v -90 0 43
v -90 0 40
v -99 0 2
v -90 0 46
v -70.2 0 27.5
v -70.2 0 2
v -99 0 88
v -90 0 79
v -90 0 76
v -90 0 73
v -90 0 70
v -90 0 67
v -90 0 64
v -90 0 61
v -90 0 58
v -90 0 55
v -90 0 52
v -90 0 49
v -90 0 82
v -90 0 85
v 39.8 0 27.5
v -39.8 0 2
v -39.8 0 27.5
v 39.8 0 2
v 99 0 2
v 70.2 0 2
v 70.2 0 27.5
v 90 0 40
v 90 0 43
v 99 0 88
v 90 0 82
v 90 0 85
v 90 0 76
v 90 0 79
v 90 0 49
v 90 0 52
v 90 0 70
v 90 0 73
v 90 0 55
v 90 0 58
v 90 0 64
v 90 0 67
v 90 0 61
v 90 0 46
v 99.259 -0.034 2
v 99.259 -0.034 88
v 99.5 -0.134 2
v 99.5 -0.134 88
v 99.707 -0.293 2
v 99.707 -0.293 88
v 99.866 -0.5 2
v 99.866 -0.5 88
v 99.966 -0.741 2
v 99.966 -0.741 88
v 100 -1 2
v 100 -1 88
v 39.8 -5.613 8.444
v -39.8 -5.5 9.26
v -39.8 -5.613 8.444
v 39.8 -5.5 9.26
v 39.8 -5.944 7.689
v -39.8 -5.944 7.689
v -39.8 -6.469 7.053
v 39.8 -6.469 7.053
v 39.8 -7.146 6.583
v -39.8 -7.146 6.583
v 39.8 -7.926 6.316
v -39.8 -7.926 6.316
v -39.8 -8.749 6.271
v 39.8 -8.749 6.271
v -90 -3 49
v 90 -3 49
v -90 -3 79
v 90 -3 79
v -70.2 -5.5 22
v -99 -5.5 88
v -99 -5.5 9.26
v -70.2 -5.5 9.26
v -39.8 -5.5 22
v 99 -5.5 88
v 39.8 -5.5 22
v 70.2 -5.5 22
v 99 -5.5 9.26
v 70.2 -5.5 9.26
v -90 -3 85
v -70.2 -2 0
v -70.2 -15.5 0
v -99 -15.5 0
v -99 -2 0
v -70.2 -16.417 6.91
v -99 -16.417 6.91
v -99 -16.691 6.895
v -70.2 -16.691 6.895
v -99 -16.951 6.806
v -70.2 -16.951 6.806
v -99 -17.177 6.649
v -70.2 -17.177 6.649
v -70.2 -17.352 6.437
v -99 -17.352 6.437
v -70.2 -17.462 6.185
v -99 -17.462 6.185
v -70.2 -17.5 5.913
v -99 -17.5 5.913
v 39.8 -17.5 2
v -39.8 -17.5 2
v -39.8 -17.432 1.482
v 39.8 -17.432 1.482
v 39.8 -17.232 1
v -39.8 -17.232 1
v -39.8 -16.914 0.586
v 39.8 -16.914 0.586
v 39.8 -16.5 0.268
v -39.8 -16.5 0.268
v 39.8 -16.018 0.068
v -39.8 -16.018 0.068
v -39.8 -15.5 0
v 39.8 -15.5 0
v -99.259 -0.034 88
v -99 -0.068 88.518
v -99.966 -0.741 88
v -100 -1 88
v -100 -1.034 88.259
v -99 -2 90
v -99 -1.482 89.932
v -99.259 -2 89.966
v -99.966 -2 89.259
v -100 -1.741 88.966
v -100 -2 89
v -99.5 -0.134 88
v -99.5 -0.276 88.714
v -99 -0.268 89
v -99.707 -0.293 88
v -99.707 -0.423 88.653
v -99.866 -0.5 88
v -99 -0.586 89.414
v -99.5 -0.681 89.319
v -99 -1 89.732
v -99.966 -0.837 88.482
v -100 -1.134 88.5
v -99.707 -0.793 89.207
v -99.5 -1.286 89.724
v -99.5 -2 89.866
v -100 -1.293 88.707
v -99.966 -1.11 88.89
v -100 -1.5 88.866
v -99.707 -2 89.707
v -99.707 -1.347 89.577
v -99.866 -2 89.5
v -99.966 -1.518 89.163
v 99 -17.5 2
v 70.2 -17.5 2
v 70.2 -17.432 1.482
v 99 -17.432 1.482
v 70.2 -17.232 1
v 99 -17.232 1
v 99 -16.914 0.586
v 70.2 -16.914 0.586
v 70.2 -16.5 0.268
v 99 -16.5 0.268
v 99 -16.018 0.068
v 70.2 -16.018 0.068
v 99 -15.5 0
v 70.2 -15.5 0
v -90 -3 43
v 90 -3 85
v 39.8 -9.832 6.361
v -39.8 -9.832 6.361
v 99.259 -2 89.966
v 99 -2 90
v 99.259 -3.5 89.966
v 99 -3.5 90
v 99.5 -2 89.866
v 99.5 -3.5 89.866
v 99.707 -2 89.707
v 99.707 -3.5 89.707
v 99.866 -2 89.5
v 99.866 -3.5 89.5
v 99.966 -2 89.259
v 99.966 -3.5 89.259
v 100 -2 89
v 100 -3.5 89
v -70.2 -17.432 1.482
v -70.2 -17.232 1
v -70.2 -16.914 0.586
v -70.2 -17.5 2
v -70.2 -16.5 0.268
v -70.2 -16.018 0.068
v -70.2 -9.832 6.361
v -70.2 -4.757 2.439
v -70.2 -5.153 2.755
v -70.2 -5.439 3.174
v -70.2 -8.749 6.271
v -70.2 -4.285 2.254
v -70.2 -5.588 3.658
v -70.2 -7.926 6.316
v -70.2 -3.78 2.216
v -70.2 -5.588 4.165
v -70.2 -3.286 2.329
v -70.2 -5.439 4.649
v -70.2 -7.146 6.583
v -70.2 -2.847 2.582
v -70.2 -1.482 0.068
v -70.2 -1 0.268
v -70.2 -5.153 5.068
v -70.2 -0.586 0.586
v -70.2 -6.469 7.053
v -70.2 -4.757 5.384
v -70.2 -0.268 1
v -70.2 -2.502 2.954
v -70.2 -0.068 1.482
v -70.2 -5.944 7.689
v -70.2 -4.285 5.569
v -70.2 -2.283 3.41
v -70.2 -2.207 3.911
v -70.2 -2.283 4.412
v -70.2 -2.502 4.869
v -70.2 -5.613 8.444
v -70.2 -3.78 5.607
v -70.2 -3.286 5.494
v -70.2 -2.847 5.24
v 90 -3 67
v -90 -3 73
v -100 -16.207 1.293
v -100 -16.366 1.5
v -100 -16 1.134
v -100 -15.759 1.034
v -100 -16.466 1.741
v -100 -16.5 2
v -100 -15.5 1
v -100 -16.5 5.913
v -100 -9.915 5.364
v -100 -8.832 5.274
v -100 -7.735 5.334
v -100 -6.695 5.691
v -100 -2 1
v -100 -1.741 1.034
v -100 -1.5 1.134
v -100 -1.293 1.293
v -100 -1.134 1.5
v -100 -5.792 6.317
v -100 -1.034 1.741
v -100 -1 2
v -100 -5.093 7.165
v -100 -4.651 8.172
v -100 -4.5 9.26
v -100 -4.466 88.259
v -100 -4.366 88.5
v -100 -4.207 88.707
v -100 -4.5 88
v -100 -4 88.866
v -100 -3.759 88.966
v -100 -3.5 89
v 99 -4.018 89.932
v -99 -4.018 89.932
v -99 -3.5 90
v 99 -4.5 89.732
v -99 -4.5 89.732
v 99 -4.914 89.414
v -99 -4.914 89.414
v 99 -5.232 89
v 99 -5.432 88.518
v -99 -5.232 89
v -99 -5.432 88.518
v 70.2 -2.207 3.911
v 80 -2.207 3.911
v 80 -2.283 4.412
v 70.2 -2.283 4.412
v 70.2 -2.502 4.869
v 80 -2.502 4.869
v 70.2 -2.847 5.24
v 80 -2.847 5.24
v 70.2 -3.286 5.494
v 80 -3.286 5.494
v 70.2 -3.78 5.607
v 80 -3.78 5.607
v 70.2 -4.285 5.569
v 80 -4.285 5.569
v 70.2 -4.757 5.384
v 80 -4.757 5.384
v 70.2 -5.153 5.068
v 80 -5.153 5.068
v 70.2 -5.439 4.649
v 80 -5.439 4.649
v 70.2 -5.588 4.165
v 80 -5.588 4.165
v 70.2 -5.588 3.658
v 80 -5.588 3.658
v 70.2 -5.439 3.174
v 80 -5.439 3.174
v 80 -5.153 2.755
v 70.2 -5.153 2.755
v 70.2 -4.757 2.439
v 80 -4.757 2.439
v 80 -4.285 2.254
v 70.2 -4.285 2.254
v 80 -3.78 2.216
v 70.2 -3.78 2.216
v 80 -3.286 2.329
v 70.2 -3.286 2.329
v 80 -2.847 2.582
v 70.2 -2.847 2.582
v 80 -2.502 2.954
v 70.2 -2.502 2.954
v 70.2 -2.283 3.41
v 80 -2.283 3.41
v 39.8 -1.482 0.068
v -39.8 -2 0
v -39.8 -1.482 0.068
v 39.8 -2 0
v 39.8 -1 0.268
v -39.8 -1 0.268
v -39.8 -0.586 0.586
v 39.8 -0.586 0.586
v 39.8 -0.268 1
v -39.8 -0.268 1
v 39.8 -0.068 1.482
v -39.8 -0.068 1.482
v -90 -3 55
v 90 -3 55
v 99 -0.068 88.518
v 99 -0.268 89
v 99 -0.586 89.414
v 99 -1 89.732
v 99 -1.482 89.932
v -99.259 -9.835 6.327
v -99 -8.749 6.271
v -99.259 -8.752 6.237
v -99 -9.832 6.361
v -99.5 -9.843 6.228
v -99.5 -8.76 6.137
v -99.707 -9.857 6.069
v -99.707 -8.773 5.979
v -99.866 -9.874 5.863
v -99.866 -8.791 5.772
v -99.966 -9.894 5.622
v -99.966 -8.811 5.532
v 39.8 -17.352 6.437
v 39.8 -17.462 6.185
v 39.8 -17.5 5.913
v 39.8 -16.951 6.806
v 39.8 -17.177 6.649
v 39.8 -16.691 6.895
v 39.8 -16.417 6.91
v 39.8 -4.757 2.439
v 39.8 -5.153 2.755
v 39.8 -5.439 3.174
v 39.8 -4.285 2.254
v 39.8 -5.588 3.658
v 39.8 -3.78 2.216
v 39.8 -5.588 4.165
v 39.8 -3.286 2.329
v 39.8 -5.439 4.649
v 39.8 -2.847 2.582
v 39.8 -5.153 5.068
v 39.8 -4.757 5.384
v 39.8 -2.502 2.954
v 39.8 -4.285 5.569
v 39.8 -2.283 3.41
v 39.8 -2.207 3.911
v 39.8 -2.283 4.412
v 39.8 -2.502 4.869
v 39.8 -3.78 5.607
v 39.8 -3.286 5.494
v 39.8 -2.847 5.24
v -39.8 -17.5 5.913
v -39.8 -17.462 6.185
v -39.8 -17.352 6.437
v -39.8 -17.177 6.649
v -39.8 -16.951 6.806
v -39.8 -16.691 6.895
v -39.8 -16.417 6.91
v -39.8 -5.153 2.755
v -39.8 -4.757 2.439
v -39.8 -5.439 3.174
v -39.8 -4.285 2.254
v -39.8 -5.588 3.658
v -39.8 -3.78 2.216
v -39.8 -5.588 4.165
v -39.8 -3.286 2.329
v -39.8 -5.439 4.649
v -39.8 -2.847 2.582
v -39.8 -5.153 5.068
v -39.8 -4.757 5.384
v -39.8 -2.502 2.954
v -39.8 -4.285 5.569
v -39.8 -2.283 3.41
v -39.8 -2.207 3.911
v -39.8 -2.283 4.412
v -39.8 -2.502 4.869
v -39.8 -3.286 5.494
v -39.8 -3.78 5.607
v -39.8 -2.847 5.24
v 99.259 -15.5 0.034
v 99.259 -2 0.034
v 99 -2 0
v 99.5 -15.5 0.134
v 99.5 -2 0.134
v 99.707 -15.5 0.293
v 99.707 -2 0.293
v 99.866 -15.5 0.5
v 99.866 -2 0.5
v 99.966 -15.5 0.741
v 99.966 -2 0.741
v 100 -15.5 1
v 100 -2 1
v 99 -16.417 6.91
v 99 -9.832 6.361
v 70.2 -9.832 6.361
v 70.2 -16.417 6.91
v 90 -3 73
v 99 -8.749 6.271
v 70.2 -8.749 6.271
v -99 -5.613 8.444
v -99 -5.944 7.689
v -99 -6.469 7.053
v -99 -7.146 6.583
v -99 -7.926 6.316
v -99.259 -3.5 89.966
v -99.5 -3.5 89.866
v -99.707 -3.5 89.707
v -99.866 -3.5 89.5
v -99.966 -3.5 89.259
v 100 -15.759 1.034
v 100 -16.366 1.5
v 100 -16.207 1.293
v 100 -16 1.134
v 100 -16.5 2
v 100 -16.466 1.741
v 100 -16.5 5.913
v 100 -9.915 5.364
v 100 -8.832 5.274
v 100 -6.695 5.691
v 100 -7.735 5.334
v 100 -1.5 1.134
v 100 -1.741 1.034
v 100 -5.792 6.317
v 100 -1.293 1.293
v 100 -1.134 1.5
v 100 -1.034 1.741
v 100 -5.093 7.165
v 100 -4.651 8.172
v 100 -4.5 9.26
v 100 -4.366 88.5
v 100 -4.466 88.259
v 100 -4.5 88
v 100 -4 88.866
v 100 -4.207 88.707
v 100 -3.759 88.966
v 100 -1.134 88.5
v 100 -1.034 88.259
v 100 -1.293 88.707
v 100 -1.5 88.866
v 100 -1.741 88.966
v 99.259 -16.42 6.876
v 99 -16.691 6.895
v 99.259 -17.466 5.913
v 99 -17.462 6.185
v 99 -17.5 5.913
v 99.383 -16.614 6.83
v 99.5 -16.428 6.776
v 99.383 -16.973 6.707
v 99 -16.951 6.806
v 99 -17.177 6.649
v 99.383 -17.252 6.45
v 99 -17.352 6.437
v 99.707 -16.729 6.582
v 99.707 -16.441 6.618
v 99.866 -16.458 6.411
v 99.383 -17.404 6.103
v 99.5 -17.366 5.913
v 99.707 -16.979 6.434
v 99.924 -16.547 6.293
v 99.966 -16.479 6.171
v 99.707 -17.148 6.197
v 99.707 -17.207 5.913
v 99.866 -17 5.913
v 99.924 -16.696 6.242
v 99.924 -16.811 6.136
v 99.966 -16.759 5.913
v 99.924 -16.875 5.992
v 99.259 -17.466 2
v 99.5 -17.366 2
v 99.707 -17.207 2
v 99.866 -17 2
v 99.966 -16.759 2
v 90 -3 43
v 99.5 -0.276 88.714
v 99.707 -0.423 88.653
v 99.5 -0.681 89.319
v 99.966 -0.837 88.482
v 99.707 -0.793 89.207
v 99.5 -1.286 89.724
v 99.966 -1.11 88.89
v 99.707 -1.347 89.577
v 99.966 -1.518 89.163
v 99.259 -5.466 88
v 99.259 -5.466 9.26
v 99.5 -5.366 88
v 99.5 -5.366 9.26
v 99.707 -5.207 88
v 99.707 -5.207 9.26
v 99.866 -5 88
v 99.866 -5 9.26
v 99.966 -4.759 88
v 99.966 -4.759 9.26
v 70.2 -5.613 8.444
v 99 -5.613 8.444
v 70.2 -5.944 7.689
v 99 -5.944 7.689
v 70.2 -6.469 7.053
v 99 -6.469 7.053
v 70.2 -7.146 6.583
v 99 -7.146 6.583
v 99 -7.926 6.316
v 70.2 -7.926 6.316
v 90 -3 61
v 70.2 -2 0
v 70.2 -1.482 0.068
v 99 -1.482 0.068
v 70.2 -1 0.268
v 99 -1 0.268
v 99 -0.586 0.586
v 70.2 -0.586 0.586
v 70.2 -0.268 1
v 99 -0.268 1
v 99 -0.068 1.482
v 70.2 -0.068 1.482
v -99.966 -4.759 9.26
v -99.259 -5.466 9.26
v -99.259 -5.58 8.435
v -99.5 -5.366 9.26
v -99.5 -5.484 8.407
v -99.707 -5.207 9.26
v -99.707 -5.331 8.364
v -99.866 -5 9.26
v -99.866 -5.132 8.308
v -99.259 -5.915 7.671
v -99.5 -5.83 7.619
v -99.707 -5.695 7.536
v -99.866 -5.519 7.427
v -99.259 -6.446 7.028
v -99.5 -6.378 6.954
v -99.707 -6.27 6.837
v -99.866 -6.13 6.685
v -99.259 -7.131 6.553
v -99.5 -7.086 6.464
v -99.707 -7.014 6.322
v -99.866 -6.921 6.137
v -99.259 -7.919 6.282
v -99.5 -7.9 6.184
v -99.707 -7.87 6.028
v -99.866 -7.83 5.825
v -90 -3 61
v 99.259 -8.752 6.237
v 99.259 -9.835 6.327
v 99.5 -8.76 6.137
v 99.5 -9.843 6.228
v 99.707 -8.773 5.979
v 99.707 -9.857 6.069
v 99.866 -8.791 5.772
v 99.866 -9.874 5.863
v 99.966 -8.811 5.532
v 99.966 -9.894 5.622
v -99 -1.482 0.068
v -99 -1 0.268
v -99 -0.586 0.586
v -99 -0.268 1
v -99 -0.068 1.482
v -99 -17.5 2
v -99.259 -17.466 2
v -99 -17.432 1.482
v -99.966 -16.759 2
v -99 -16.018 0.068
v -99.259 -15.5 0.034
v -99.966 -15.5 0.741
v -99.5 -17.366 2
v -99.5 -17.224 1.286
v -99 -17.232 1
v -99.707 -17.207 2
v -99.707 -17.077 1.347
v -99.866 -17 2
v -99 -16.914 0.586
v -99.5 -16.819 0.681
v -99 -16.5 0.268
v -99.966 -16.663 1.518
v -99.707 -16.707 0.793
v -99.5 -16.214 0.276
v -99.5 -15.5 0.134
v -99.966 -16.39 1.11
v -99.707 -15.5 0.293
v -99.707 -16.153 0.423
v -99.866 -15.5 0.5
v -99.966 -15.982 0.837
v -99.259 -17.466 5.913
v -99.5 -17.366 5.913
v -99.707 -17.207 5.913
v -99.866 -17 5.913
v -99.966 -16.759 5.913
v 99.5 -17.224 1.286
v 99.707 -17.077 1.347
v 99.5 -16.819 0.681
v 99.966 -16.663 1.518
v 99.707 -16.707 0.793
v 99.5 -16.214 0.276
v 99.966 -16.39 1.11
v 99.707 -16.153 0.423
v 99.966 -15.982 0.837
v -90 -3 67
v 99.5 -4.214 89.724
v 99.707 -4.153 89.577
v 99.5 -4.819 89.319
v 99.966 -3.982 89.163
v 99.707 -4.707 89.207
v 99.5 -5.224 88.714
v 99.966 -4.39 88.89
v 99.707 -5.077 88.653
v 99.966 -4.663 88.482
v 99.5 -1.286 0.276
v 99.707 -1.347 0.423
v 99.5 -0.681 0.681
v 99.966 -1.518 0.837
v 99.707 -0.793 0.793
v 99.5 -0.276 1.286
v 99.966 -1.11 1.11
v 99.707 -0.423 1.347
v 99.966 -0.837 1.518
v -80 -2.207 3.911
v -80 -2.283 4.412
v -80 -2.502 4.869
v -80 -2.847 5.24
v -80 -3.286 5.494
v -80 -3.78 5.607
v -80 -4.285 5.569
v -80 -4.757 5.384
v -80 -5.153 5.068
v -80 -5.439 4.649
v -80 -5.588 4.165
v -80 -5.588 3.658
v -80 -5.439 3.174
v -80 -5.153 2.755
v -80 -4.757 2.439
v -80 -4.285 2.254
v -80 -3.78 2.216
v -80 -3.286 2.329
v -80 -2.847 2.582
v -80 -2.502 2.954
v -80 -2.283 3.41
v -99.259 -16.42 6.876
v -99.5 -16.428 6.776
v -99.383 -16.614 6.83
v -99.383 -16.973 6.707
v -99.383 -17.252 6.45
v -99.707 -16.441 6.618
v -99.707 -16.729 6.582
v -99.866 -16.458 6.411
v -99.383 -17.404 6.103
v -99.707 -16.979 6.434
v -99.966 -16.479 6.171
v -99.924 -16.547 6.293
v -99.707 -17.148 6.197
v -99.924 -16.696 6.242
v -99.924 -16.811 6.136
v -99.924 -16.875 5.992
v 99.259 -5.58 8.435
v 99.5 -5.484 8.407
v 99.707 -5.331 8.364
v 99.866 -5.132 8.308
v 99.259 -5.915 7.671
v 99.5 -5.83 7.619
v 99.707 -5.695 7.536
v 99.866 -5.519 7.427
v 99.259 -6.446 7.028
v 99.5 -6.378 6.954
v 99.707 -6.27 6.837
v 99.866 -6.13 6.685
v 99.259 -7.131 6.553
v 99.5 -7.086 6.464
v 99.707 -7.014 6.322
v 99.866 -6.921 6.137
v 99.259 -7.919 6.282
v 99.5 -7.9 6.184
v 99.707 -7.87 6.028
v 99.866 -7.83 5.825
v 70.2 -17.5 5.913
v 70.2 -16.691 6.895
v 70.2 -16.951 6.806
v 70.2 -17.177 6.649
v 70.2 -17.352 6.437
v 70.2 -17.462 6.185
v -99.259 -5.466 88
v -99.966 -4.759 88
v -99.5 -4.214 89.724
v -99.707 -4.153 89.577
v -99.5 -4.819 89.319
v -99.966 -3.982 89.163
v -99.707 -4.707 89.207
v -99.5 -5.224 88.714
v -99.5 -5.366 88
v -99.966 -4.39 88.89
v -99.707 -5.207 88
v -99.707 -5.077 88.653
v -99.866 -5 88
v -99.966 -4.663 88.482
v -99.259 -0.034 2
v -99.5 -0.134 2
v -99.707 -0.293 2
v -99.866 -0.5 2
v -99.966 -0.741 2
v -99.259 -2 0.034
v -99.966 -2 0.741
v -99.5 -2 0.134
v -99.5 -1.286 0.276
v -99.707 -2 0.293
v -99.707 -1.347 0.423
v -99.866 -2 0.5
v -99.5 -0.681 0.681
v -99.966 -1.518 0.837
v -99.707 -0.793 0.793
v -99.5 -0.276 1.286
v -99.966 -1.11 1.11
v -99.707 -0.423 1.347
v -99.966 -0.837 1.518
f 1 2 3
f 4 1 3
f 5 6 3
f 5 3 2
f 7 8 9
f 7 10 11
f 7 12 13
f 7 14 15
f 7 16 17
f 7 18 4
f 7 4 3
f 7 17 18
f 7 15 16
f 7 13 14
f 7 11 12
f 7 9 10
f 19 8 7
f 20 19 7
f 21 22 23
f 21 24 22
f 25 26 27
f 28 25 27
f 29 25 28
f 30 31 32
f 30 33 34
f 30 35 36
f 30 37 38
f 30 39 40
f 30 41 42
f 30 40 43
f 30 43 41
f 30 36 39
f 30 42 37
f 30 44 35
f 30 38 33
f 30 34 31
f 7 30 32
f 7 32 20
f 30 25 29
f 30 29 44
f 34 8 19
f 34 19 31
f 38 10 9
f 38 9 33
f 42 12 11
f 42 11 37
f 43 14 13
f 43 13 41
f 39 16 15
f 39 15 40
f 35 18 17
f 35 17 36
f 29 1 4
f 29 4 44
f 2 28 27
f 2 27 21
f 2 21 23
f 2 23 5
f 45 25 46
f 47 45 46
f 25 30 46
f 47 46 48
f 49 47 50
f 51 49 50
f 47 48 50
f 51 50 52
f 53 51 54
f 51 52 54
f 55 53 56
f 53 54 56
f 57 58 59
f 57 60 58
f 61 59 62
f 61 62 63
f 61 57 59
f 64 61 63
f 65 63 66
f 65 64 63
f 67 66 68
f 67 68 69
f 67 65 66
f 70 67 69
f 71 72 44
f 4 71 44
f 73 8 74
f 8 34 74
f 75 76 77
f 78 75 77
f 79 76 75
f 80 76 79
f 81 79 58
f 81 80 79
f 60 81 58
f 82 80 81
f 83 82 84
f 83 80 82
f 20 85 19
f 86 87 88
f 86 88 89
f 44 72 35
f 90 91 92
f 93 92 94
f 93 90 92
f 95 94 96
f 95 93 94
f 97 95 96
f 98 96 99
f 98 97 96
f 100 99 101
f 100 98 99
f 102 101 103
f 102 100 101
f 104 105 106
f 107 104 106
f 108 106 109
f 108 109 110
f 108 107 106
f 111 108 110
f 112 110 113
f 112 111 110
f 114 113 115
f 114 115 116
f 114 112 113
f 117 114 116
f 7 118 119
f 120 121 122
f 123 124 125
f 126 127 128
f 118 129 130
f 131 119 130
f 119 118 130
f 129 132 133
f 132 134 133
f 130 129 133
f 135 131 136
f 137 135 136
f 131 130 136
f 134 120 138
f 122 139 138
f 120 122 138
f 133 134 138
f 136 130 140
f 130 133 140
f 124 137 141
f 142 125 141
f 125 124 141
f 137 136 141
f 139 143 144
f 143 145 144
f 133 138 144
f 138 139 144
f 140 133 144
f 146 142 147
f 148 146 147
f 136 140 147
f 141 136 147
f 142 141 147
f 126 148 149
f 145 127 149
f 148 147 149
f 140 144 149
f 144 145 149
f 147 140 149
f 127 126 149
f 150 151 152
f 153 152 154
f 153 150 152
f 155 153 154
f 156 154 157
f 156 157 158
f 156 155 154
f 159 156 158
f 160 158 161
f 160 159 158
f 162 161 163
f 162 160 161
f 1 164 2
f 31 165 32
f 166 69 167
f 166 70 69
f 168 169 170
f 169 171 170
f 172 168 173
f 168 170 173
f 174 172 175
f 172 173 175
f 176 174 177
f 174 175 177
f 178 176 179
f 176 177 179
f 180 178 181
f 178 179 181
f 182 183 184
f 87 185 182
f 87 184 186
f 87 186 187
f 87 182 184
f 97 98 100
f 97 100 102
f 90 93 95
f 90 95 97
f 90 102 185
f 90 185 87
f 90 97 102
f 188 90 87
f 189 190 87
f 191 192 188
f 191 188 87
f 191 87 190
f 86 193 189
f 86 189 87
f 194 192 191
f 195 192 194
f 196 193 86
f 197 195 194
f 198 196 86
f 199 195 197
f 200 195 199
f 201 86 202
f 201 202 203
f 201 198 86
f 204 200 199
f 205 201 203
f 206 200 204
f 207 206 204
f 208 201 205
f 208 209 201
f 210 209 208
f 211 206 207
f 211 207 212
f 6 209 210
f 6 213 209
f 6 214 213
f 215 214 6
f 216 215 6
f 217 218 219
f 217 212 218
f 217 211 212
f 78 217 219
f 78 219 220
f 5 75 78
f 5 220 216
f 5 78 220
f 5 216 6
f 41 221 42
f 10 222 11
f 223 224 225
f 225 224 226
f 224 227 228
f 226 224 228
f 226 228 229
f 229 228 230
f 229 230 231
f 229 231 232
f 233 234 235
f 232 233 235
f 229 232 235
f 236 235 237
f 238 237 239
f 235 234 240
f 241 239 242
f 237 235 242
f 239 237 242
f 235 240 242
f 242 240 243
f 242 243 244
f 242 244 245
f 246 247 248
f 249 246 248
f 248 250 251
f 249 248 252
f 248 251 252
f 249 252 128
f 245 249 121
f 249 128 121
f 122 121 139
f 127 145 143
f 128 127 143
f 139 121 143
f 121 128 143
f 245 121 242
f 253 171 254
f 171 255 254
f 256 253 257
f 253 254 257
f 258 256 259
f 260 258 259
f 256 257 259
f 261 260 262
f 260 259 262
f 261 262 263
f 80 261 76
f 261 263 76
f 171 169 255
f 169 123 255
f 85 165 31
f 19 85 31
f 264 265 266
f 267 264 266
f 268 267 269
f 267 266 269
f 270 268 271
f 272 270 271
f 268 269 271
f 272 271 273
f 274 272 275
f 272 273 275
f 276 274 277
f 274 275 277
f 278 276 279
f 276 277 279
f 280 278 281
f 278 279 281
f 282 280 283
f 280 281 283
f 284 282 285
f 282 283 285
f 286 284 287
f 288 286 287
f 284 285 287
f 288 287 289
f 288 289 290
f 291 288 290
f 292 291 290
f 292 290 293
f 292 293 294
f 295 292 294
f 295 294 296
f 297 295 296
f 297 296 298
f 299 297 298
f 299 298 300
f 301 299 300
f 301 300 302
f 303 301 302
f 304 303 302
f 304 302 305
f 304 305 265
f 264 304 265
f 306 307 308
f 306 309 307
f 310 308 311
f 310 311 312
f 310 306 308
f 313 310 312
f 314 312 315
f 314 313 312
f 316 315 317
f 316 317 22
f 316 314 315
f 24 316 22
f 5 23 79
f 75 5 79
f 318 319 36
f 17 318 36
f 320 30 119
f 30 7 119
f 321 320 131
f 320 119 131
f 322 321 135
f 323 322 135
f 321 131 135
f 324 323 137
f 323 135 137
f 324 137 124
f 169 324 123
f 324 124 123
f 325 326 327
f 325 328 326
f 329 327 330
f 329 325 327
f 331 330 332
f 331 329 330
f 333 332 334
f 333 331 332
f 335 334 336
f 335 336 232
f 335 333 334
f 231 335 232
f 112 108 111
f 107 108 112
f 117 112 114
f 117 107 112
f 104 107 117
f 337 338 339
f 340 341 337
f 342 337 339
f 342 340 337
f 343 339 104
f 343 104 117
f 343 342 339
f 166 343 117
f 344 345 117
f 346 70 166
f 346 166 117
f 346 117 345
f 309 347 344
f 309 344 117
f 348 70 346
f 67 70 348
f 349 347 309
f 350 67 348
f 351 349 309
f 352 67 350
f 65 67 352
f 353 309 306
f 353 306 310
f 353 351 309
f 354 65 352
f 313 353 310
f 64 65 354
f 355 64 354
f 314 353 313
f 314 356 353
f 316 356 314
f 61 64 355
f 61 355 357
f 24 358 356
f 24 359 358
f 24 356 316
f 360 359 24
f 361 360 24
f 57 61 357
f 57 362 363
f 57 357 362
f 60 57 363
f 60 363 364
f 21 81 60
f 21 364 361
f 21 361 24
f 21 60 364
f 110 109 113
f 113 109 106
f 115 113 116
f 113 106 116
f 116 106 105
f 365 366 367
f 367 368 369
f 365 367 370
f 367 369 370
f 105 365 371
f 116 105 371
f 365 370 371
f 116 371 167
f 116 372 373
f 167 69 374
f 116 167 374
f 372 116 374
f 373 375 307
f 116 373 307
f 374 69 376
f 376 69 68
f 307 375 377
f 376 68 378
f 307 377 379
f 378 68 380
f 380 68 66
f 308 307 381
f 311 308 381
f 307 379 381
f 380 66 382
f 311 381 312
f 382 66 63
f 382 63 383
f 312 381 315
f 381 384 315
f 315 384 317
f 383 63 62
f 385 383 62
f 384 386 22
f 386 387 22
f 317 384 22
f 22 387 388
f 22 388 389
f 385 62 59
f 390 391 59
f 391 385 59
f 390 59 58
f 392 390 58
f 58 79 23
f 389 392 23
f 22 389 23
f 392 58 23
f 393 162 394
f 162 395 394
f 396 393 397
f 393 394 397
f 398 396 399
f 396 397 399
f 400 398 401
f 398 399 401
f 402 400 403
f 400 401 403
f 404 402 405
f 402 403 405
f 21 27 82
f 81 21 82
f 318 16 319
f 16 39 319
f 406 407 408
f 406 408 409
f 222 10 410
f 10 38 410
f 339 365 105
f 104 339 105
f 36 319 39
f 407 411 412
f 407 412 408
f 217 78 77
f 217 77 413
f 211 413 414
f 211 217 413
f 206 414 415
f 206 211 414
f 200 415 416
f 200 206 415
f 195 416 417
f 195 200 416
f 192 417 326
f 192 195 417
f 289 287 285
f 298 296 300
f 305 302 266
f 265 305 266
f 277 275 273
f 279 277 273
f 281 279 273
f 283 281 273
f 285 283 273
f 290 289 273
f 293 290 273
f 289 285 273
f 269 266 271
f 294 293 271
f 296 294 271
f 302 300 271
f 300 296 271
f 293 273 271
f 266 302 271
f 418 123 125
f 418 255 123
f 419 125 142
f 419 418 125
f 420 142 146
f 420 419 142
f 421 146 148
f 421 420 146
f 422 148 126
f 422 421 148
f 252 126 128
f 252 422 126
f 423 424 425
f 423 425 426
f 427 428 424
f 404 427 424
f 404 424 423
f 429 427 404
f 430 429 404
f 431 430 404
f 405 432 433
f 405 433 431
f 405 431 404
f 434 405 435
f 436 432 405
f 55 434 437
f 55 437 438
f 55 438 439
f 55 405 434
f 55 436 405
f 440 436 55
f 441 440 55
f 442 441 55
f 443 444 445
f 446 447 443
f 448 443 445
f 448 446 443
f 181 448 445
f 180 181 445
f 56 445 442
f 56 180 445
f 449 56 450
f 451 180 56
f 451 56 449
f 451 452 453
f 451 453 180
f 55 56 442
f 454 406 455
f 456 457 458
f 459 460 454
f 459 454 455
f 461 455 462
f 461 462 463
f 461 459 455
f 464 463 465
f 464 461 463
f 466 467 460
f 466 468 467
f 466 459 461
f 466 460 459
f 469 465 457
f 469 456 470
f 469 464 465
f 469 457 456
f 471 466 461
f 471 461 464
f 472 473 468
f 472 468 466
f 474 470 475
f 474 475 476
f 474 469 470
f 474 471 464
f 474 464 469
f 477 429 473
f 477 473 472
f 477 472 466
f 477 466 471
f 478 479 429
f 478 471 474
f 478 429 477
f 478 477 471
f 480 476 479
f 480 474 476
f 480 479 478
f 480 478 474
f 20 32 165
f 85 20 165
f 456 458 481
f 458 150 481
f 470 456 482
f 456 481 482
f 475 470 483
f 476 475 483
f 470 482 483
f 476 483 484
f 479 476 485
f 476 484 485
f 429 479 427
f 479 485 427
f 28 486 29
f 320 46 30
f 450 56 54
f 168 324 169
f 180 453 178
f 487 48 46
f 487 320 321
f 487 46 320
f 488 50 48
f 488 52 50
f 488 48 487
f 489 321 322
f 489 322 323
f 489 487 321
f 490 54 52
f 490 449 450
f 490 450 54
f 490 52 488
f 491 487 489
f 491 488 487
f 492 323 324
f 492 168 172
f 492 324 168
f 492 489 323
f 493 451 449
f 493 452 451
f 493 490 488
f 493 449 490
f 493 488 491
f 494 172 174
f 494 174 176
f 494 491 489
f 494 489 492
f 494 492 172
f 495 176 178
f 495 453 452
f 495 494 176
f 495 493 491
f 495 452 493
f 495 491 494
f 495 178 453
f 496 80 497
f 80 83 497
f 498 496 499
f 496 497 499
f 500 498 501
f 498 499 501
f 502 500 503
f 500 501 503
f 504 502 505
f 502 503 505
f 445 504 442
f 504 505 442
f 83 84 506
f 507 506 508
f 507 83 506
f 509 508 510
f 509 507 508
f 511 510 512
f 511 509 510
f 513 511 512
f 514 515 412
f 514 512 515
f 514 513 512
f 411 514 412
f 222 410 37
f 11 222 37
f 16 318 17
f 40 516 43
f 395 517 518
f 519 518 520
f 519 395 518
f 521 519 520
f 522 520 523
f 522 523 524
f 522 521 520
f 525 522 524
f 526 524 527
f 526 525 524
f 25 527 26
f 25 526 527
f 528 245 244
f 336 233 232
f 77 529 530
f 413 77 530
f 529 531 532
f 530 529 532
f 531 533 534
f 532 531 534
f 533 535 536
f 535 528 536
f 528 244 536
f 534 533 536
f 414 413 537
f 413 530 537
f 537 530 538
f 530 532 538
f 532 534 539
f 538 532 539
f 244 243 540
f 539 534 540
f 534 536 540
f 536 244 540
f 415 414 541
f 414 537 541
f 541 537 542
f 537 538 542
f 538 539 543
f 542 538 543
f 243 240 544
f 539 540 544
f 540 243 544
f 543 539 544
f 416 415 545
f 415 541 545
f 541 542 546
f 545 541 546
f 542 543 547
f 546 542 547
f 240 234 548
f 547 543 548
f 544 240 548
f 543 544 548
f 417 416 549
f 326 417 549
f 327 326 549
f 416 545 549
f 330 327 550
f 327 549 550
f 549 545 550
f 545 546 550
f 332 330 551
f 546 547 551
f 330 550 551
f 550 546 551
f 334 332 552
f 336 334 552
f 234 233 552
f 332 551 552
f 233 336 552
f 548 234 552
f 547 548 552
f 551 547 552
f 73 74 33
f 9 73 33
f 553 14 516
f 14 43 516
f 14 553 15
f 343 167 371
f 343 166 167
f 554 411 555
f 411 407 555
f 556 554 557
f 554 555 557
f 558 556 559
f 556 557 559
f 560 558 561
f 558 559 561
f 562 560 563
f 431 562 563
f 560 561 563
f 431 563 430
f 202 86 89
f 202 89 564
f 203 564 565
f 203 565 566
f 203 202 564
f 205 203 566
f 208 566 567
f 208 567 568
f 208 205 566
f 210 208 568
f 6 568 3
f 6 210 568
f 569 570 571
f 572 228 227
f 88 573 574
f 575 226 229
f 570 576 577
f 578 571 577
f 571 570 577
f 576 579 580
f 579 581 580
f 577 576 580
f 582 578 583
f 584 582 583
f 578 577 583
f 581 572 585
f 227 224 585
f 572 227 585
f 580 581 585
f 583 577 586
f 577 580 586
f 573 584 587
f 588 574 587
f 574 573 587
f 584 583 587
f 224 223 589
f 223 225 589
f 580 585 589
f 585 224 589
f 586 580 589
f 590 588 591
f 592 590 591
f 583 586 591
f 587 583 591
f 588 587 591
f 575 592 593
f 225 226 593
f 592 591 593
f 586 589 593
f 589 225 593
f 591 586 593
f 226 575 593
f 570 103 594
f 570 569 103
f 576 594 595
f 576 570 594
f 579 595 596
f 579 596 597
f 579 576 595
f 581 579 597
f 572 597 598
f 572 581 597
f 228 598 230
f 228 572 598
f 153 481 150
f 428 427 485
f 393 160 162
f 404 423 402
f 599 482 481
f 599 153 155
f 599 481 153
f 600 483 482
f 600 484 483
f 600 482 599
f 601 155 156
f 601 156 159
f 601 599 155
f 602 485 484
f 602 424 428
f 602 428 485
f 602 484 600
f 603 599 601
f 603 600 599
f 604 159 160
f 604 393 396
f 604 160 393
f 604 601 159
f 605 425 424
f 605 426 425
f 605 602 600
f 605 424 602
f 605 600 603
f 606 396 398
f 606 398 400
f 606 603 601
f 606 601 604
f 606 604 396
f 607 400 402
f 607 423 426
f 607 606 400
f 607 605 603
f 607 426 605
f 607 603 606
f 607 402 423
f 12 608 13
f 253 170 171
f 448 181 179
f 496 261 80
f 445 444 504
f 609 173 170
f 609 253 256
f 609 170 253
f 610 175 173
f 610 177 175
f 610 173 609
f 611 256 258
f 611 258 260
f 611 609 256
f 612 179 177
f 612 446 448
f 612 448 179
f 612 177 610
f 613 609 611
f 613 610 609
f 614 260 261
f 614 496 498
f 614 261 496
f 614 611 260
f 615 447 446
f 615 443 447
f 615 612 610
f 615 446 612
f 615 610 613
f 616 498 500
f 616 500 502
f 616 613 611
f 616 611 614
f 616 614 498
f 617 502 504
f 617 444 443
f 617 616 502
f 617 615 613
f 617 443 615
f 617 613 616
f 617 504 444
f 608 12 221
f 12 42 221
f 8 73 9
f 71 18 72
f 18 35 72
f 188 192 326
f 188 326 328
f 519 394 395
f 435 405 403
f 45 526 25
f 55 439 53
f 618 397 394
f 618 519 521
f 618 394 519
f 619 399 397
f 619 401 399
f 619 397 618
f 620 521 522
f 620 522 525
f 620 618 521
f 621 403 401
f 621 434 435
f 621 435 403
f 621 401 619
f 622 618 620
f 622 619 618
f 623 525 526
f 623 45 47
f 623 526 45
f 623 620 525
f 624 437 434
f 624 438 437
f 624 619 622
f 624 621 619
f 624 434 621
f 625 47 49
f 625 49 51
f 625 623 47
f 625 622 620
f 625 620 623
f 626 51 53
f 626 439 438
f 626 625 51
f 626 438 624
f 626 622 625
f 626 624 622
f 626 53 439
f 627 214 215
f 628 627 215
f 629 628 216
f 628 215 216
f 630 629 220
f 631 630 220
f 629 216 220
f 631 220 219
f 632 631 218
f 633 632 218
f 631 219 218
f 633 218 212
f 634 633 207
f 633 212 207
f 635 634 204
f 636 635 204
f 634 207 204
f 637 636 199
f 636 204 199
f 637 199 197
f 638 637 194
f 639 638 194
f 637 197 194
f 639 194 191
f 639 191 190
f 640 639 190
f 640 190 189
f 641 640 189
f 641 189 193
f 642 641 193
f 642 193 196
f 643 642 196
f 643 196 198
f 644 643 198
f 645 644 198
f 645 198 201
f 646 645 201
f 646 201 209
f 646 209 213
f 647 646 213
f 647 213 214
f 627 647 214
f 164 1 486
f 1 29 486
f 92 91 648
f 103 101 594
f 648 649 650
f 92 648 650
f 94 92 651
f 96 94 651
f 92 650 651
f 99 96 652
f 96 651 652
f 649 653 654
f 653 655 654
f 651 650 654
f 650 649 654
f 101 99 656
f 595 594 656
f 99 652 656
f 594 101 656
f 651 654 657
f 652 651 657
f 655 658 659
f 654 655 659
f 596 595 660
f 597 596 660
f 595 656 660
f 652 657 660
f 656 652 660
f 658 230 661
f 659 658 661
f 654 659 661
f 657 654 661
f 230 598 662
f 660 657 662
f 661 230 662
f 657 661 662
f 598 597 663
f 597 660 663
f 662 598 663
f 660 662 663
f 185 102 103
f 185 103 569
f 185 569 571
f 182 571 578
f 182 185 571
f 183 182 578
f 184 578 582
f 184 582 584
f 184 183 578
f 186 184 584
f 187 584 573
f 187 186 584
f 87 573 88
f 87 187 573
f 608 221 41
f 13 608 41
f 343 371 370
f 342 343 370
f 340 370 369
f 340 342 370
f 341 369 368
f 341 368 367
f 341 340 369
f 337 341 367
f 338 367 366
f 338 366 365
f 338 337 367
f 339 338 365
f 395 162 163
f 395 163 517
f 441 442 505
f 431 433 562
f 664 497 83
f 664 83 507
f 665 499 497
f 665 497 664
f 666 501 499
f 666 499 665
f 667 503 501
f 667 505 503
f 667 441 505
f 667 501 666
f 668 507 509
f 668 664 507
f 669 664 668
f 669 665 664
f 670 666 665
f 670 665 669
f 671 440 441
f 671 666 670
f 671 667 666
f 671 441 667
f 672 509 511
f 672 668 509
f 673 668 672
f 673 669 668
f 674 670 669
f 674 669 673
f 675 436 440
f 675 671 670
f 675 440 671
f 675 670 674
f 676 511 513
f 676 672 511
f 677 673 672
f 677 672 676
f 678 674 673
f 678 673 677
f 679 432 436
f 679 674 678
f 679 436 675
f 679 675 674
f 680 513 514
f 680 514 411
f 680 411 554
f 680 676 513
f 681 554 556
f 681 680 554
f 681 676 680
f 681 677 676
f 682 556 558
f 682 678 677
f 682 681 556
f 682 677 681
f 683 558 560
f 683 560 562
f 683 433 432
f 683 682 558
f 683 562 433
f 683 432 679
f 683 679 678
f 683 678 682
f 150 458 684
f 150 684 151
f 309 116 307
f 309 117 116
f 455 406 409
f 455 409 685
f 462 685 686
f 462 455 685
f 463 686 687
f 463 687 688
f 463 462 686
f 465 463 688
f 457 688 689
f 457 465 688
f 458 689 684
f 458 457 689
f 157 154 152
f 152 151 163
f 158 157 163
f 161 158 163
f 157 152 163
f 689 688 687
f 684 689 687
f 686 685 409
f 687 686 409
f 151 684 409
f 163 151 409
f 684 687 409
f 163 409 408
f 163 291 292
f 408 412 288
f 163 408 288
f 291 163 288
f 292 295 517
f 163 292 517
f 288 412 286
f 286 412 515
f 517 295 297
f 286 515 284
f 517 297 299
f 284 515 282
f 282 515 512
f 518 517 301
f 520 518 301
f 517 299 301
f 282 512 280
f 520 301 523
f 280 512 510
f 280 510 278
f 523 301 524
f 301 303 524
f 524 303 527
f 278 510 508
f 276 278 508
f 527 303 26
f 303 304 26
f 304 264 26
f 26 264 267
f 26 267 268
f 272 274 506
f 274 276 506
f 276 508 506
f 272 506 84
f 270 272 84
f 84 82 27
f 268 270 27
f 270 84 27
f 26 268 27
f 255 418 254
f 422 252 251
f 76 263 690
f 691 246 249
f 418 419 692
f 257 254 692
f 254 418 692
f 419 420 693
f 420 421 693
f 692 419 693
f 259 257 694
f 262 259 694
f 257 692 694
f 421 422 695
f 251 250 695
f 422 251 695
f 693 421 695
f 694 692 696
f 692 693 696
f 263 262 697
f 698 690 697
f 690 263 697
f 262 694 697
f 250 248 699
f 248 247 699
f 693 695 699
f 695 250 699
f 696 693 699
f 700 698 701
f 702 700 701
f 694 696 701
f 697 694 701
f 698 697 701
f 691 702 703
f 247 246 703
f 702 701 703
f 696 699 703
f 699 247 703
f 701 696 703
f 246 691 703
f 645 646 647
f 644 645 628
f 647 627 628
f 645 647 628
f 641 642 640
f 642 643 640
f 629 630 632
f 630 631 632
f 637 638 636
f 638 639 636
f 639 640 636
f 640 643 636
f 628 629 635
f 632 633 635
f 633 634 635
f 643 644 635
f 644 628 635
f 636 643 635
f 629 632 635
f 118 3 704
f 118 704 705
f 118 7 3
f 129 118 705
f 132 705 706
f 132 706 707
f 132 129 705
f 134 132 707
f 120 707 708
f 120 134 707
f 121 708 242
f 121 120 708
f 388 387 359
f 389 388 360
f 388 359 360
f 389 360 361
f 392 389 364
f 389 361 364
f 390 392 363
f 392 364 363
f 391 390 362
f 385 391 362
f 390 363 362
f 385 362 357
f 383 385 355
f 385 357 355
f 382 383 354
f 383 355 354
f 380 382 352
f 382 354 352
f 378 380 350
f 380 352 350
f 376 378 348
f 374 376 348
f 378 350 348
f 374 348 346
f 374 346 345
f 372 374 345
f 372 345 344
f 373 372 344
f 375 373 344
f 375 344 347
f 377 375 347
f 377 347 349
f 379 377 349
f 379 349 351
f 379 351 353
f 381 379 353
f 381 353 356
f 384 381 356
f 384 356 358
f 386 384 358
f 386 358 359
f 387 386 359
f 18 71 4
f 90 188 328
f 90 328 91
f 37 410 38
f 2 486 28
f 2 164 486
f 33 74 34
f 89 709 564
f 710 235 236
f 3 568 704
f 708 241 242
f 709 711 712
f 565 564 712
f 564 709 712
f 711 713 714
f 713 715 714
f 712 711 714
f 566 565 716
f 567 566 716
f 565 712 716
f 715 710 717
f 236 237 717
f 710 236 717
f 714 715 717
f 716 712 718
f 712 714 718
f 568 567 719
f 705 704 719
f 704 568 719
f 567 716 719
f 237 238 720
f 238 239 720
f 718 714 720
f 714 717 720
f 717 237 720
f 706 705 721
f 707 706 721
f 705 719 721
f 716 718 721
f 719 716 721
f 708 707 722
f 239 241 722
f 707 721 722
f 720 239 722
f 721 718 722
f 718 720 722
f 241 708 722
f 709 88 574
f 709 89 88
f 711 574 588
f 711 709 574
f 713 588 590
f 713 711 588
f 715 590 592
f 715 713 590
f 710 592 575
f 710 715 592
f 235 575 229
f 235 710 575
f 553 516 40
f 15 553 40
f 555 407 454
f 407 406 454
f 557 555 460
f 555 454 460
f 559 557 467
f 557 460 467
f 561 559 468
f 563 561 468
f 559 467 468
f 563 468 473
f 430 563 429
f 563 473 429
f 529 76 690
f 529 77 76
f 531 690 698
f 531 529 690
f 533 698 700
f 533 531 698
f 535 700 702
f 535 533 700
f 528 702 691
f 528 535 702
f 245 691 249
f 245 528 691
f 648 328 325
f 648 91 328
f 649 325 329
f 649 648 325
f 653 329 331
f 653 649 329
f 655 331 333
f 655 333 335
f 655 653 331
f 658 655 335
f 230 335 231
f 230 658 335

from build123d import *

# Parameters (mm, degrees)
F1_DEPTH      = 100
F1_DEPTH_BACK = 100
F2_R          = 1
F5_DEPTH      = 70.2
F5_DEPTH_BACK = 70.2
F6_DEPTH      = 39.8
F6_DEPTH_BACK = 39.8
F3_R          = 1.7
F7_DEPTH      = 200.001
F9_DEPTH      = 90
F9_DEPTH_BACK = 90
F10_R         = 1.7
F11_DEPTH     = 20
F12_R         = 2.1690040251
F13_DEPTH     = 20


with BuildPart() as f1:
    # F0 (on Right) → F1 (new body, two sides)
    with BuildSketch(Plane.YZ) as f1_sk:
        with BuildLine():
            Line((0, 2), (0, 88))
            ThreePointArc((0, 88), (-0.5857864376, 89.4142135624), (-2, 90))
            Line((-2, 90), (-3.5, 90))
            ThreePointArc((-3.5, 90), (-4.9142135624, 89.4142135624), (-5.5, 88))
            Line((-5.5, 88), (-5.5, 43.945170586))
            Line((-5.5, 43.945170586), (-5.5, 9.2603986447))
            ThreePointArc((-5.5, 9.2603986447), (-6.468671533, 7.0527517845), (-8.7491364396, 6.27076137))
            Line((-8.7491364396, 6.27076137), (-9.8321819194, 6.36101516))
            Line((-9.8321819194, 6.36101516), (-16.4169545201, 6.90974621))
            ThreePointArc((-16.4169545201, 6.90974621), (-17.177109489, 6.6490827385), (-17.5, 5.9132004518))
            Line((-17.5, 5.9132004518), (-17.5, 2))
            ThreePointArc((-17.5, 2), (-16.9142135624, 0.5857864376), (-15.5, 0))
            Line((-15.5, 0), (-2, 0))
            ThreePointArc((-2, 0), (-0.5857864376, 0.5857864376), (0, 2))
        make_face()
    extrude(amount=F1_DEPTH)
    extrude(f1_sk.sketch, amount=-F1_DEPTH_BACK)

    # F2
    f2_edges = [f1.edges().sort_by_distance(p)[0] for p in [
        (-100, 0, 45),
        (100, 0, 45),
    ]]
    fillet(f2_edges, radius=F2_R)

    # F4 (on Right) → F5 (cut, two sides)
    with BuildSketch(Plane.YZ) as f5_sk:
        Polygon((-8.8815924794, 6.6997300052), (-19.3425188781, 7.6679212159), (-19.3425188781, 0), (0, 0), (0, 27.5), (-5.5, 22), (-5.5, 9.4664877642), align=None)
    extrude(amount=F5_DEPTH, mode=Mode.SUBTRACT)
    extrude(f5_sk.sketch, amount=-F5_DEPTH_BACK, mode=Mode.SUBTRACT)

    # F0 (on Right) → F6 (join, two sides)
    with BuildSketch(Plane.YZ) as f6_sk:
        with BuildLine():
            Line((0, 2), (0, 88))
            ThreePointArc((0, 88), (-0.5857864376, 89.4142135624), (-2, 90))
            Line((-2, 90), (-3.5, 90))
            ThreePointArc((-3.5, 90), (-4.9142135624, 89.4142135624), (-5.5, 88))
            Line((-5.5, 88), (-5.5, 43.945170586))
            Line((-5.5, 43.945170586), (-5.5, 9.2603986447))
            ThreePointArc((-5.5, 9.2603986447), (-6.468671533, 7.0527517845), (-8.7491364396, 6.27076137))
            Line((-8.7491364396, 6.27076137), (-9.8321819194, 6.36101516))
            Line((-9.8321819194, 6.36101516), (-16.4169545201, 6.90974621))
            ThreePointArc((-16.4169545201, 6.90974621), (-17.177109489, 6.6490827385), (-17.5, 5.9132004518))
            Line((-17.5, 5.9132004518), (-17.5, 2))
            ThreePointArc((-17.5, 2), (-16.9142135624, 0.5857864376), (-15.5, 0))
            Line((-15.5, 0), (-2, 0))
            ThreePointArc((-2, 0), (-0.5857864376, 0.5857864376), (0, 2))
        make_face()
    extrude(amount=F6_DEPTH)
    extrude(f6_sk.sketch, amount=-F6_DEPTH_BACK)

    # F3 (on face) → F7 (cut, through all)
    with BuildSketch(Plane.YZ.offset(100)):
        with Locations((-3.9070966475, 3.9112776819)):
            Circle(F3_R)
    extrude(amount=-F7_DEPTH, mode=Mode.SUBTRACT)

    # F8 (on Right) → F9 (cut, two sides)
    with BuildSketch(Plane.YZ) as f9_sk:
        Polygon((1.8498107092, 85), (0, 85), (-3, 85), (0, 82), (0, 79), (-3, 79), (0, 76), (0, 73), (-3, 73), (0, 70), (0, 67), (-3, 67), (0, 64), (0, 61), (-3, 61), (0, 58), (0, 55), (-3, 55), (0, 52), (0, 49), (-3, 49), (0, 46), (0, 43), (-3, 43), (0, 40), (1.8498107092, 39.9083867669), align=None)
    extrude(amount=-F9_DEPTH, mode=Mode.SUBTRACT)
    extrude(f9_sk.sketch, amount=F9_DEPTH_BACK, mode=Mode.SUBTRACT)

    # F10 (on face) → F11 (join)
    with BuildSketch(Plane.YZ.offset(100)):
        with Locations((-3.9070966475, 3.9112776819)):
            Circle(F10_R)
    extrude(amount=-F11_DEPTH)

    # F12 (on face) → F13 (join)
    with BuildSketch(Plane(origin=(-100, 0, 0), x_dir=(0, -1, 0), z_dir=(-1, 0, 0))):
        with Locations((3.9070966475, 3.9112776819)):
            Circle(F12_R)
    extrude(amount=-F13_DEPTH)


solid = f1.part
